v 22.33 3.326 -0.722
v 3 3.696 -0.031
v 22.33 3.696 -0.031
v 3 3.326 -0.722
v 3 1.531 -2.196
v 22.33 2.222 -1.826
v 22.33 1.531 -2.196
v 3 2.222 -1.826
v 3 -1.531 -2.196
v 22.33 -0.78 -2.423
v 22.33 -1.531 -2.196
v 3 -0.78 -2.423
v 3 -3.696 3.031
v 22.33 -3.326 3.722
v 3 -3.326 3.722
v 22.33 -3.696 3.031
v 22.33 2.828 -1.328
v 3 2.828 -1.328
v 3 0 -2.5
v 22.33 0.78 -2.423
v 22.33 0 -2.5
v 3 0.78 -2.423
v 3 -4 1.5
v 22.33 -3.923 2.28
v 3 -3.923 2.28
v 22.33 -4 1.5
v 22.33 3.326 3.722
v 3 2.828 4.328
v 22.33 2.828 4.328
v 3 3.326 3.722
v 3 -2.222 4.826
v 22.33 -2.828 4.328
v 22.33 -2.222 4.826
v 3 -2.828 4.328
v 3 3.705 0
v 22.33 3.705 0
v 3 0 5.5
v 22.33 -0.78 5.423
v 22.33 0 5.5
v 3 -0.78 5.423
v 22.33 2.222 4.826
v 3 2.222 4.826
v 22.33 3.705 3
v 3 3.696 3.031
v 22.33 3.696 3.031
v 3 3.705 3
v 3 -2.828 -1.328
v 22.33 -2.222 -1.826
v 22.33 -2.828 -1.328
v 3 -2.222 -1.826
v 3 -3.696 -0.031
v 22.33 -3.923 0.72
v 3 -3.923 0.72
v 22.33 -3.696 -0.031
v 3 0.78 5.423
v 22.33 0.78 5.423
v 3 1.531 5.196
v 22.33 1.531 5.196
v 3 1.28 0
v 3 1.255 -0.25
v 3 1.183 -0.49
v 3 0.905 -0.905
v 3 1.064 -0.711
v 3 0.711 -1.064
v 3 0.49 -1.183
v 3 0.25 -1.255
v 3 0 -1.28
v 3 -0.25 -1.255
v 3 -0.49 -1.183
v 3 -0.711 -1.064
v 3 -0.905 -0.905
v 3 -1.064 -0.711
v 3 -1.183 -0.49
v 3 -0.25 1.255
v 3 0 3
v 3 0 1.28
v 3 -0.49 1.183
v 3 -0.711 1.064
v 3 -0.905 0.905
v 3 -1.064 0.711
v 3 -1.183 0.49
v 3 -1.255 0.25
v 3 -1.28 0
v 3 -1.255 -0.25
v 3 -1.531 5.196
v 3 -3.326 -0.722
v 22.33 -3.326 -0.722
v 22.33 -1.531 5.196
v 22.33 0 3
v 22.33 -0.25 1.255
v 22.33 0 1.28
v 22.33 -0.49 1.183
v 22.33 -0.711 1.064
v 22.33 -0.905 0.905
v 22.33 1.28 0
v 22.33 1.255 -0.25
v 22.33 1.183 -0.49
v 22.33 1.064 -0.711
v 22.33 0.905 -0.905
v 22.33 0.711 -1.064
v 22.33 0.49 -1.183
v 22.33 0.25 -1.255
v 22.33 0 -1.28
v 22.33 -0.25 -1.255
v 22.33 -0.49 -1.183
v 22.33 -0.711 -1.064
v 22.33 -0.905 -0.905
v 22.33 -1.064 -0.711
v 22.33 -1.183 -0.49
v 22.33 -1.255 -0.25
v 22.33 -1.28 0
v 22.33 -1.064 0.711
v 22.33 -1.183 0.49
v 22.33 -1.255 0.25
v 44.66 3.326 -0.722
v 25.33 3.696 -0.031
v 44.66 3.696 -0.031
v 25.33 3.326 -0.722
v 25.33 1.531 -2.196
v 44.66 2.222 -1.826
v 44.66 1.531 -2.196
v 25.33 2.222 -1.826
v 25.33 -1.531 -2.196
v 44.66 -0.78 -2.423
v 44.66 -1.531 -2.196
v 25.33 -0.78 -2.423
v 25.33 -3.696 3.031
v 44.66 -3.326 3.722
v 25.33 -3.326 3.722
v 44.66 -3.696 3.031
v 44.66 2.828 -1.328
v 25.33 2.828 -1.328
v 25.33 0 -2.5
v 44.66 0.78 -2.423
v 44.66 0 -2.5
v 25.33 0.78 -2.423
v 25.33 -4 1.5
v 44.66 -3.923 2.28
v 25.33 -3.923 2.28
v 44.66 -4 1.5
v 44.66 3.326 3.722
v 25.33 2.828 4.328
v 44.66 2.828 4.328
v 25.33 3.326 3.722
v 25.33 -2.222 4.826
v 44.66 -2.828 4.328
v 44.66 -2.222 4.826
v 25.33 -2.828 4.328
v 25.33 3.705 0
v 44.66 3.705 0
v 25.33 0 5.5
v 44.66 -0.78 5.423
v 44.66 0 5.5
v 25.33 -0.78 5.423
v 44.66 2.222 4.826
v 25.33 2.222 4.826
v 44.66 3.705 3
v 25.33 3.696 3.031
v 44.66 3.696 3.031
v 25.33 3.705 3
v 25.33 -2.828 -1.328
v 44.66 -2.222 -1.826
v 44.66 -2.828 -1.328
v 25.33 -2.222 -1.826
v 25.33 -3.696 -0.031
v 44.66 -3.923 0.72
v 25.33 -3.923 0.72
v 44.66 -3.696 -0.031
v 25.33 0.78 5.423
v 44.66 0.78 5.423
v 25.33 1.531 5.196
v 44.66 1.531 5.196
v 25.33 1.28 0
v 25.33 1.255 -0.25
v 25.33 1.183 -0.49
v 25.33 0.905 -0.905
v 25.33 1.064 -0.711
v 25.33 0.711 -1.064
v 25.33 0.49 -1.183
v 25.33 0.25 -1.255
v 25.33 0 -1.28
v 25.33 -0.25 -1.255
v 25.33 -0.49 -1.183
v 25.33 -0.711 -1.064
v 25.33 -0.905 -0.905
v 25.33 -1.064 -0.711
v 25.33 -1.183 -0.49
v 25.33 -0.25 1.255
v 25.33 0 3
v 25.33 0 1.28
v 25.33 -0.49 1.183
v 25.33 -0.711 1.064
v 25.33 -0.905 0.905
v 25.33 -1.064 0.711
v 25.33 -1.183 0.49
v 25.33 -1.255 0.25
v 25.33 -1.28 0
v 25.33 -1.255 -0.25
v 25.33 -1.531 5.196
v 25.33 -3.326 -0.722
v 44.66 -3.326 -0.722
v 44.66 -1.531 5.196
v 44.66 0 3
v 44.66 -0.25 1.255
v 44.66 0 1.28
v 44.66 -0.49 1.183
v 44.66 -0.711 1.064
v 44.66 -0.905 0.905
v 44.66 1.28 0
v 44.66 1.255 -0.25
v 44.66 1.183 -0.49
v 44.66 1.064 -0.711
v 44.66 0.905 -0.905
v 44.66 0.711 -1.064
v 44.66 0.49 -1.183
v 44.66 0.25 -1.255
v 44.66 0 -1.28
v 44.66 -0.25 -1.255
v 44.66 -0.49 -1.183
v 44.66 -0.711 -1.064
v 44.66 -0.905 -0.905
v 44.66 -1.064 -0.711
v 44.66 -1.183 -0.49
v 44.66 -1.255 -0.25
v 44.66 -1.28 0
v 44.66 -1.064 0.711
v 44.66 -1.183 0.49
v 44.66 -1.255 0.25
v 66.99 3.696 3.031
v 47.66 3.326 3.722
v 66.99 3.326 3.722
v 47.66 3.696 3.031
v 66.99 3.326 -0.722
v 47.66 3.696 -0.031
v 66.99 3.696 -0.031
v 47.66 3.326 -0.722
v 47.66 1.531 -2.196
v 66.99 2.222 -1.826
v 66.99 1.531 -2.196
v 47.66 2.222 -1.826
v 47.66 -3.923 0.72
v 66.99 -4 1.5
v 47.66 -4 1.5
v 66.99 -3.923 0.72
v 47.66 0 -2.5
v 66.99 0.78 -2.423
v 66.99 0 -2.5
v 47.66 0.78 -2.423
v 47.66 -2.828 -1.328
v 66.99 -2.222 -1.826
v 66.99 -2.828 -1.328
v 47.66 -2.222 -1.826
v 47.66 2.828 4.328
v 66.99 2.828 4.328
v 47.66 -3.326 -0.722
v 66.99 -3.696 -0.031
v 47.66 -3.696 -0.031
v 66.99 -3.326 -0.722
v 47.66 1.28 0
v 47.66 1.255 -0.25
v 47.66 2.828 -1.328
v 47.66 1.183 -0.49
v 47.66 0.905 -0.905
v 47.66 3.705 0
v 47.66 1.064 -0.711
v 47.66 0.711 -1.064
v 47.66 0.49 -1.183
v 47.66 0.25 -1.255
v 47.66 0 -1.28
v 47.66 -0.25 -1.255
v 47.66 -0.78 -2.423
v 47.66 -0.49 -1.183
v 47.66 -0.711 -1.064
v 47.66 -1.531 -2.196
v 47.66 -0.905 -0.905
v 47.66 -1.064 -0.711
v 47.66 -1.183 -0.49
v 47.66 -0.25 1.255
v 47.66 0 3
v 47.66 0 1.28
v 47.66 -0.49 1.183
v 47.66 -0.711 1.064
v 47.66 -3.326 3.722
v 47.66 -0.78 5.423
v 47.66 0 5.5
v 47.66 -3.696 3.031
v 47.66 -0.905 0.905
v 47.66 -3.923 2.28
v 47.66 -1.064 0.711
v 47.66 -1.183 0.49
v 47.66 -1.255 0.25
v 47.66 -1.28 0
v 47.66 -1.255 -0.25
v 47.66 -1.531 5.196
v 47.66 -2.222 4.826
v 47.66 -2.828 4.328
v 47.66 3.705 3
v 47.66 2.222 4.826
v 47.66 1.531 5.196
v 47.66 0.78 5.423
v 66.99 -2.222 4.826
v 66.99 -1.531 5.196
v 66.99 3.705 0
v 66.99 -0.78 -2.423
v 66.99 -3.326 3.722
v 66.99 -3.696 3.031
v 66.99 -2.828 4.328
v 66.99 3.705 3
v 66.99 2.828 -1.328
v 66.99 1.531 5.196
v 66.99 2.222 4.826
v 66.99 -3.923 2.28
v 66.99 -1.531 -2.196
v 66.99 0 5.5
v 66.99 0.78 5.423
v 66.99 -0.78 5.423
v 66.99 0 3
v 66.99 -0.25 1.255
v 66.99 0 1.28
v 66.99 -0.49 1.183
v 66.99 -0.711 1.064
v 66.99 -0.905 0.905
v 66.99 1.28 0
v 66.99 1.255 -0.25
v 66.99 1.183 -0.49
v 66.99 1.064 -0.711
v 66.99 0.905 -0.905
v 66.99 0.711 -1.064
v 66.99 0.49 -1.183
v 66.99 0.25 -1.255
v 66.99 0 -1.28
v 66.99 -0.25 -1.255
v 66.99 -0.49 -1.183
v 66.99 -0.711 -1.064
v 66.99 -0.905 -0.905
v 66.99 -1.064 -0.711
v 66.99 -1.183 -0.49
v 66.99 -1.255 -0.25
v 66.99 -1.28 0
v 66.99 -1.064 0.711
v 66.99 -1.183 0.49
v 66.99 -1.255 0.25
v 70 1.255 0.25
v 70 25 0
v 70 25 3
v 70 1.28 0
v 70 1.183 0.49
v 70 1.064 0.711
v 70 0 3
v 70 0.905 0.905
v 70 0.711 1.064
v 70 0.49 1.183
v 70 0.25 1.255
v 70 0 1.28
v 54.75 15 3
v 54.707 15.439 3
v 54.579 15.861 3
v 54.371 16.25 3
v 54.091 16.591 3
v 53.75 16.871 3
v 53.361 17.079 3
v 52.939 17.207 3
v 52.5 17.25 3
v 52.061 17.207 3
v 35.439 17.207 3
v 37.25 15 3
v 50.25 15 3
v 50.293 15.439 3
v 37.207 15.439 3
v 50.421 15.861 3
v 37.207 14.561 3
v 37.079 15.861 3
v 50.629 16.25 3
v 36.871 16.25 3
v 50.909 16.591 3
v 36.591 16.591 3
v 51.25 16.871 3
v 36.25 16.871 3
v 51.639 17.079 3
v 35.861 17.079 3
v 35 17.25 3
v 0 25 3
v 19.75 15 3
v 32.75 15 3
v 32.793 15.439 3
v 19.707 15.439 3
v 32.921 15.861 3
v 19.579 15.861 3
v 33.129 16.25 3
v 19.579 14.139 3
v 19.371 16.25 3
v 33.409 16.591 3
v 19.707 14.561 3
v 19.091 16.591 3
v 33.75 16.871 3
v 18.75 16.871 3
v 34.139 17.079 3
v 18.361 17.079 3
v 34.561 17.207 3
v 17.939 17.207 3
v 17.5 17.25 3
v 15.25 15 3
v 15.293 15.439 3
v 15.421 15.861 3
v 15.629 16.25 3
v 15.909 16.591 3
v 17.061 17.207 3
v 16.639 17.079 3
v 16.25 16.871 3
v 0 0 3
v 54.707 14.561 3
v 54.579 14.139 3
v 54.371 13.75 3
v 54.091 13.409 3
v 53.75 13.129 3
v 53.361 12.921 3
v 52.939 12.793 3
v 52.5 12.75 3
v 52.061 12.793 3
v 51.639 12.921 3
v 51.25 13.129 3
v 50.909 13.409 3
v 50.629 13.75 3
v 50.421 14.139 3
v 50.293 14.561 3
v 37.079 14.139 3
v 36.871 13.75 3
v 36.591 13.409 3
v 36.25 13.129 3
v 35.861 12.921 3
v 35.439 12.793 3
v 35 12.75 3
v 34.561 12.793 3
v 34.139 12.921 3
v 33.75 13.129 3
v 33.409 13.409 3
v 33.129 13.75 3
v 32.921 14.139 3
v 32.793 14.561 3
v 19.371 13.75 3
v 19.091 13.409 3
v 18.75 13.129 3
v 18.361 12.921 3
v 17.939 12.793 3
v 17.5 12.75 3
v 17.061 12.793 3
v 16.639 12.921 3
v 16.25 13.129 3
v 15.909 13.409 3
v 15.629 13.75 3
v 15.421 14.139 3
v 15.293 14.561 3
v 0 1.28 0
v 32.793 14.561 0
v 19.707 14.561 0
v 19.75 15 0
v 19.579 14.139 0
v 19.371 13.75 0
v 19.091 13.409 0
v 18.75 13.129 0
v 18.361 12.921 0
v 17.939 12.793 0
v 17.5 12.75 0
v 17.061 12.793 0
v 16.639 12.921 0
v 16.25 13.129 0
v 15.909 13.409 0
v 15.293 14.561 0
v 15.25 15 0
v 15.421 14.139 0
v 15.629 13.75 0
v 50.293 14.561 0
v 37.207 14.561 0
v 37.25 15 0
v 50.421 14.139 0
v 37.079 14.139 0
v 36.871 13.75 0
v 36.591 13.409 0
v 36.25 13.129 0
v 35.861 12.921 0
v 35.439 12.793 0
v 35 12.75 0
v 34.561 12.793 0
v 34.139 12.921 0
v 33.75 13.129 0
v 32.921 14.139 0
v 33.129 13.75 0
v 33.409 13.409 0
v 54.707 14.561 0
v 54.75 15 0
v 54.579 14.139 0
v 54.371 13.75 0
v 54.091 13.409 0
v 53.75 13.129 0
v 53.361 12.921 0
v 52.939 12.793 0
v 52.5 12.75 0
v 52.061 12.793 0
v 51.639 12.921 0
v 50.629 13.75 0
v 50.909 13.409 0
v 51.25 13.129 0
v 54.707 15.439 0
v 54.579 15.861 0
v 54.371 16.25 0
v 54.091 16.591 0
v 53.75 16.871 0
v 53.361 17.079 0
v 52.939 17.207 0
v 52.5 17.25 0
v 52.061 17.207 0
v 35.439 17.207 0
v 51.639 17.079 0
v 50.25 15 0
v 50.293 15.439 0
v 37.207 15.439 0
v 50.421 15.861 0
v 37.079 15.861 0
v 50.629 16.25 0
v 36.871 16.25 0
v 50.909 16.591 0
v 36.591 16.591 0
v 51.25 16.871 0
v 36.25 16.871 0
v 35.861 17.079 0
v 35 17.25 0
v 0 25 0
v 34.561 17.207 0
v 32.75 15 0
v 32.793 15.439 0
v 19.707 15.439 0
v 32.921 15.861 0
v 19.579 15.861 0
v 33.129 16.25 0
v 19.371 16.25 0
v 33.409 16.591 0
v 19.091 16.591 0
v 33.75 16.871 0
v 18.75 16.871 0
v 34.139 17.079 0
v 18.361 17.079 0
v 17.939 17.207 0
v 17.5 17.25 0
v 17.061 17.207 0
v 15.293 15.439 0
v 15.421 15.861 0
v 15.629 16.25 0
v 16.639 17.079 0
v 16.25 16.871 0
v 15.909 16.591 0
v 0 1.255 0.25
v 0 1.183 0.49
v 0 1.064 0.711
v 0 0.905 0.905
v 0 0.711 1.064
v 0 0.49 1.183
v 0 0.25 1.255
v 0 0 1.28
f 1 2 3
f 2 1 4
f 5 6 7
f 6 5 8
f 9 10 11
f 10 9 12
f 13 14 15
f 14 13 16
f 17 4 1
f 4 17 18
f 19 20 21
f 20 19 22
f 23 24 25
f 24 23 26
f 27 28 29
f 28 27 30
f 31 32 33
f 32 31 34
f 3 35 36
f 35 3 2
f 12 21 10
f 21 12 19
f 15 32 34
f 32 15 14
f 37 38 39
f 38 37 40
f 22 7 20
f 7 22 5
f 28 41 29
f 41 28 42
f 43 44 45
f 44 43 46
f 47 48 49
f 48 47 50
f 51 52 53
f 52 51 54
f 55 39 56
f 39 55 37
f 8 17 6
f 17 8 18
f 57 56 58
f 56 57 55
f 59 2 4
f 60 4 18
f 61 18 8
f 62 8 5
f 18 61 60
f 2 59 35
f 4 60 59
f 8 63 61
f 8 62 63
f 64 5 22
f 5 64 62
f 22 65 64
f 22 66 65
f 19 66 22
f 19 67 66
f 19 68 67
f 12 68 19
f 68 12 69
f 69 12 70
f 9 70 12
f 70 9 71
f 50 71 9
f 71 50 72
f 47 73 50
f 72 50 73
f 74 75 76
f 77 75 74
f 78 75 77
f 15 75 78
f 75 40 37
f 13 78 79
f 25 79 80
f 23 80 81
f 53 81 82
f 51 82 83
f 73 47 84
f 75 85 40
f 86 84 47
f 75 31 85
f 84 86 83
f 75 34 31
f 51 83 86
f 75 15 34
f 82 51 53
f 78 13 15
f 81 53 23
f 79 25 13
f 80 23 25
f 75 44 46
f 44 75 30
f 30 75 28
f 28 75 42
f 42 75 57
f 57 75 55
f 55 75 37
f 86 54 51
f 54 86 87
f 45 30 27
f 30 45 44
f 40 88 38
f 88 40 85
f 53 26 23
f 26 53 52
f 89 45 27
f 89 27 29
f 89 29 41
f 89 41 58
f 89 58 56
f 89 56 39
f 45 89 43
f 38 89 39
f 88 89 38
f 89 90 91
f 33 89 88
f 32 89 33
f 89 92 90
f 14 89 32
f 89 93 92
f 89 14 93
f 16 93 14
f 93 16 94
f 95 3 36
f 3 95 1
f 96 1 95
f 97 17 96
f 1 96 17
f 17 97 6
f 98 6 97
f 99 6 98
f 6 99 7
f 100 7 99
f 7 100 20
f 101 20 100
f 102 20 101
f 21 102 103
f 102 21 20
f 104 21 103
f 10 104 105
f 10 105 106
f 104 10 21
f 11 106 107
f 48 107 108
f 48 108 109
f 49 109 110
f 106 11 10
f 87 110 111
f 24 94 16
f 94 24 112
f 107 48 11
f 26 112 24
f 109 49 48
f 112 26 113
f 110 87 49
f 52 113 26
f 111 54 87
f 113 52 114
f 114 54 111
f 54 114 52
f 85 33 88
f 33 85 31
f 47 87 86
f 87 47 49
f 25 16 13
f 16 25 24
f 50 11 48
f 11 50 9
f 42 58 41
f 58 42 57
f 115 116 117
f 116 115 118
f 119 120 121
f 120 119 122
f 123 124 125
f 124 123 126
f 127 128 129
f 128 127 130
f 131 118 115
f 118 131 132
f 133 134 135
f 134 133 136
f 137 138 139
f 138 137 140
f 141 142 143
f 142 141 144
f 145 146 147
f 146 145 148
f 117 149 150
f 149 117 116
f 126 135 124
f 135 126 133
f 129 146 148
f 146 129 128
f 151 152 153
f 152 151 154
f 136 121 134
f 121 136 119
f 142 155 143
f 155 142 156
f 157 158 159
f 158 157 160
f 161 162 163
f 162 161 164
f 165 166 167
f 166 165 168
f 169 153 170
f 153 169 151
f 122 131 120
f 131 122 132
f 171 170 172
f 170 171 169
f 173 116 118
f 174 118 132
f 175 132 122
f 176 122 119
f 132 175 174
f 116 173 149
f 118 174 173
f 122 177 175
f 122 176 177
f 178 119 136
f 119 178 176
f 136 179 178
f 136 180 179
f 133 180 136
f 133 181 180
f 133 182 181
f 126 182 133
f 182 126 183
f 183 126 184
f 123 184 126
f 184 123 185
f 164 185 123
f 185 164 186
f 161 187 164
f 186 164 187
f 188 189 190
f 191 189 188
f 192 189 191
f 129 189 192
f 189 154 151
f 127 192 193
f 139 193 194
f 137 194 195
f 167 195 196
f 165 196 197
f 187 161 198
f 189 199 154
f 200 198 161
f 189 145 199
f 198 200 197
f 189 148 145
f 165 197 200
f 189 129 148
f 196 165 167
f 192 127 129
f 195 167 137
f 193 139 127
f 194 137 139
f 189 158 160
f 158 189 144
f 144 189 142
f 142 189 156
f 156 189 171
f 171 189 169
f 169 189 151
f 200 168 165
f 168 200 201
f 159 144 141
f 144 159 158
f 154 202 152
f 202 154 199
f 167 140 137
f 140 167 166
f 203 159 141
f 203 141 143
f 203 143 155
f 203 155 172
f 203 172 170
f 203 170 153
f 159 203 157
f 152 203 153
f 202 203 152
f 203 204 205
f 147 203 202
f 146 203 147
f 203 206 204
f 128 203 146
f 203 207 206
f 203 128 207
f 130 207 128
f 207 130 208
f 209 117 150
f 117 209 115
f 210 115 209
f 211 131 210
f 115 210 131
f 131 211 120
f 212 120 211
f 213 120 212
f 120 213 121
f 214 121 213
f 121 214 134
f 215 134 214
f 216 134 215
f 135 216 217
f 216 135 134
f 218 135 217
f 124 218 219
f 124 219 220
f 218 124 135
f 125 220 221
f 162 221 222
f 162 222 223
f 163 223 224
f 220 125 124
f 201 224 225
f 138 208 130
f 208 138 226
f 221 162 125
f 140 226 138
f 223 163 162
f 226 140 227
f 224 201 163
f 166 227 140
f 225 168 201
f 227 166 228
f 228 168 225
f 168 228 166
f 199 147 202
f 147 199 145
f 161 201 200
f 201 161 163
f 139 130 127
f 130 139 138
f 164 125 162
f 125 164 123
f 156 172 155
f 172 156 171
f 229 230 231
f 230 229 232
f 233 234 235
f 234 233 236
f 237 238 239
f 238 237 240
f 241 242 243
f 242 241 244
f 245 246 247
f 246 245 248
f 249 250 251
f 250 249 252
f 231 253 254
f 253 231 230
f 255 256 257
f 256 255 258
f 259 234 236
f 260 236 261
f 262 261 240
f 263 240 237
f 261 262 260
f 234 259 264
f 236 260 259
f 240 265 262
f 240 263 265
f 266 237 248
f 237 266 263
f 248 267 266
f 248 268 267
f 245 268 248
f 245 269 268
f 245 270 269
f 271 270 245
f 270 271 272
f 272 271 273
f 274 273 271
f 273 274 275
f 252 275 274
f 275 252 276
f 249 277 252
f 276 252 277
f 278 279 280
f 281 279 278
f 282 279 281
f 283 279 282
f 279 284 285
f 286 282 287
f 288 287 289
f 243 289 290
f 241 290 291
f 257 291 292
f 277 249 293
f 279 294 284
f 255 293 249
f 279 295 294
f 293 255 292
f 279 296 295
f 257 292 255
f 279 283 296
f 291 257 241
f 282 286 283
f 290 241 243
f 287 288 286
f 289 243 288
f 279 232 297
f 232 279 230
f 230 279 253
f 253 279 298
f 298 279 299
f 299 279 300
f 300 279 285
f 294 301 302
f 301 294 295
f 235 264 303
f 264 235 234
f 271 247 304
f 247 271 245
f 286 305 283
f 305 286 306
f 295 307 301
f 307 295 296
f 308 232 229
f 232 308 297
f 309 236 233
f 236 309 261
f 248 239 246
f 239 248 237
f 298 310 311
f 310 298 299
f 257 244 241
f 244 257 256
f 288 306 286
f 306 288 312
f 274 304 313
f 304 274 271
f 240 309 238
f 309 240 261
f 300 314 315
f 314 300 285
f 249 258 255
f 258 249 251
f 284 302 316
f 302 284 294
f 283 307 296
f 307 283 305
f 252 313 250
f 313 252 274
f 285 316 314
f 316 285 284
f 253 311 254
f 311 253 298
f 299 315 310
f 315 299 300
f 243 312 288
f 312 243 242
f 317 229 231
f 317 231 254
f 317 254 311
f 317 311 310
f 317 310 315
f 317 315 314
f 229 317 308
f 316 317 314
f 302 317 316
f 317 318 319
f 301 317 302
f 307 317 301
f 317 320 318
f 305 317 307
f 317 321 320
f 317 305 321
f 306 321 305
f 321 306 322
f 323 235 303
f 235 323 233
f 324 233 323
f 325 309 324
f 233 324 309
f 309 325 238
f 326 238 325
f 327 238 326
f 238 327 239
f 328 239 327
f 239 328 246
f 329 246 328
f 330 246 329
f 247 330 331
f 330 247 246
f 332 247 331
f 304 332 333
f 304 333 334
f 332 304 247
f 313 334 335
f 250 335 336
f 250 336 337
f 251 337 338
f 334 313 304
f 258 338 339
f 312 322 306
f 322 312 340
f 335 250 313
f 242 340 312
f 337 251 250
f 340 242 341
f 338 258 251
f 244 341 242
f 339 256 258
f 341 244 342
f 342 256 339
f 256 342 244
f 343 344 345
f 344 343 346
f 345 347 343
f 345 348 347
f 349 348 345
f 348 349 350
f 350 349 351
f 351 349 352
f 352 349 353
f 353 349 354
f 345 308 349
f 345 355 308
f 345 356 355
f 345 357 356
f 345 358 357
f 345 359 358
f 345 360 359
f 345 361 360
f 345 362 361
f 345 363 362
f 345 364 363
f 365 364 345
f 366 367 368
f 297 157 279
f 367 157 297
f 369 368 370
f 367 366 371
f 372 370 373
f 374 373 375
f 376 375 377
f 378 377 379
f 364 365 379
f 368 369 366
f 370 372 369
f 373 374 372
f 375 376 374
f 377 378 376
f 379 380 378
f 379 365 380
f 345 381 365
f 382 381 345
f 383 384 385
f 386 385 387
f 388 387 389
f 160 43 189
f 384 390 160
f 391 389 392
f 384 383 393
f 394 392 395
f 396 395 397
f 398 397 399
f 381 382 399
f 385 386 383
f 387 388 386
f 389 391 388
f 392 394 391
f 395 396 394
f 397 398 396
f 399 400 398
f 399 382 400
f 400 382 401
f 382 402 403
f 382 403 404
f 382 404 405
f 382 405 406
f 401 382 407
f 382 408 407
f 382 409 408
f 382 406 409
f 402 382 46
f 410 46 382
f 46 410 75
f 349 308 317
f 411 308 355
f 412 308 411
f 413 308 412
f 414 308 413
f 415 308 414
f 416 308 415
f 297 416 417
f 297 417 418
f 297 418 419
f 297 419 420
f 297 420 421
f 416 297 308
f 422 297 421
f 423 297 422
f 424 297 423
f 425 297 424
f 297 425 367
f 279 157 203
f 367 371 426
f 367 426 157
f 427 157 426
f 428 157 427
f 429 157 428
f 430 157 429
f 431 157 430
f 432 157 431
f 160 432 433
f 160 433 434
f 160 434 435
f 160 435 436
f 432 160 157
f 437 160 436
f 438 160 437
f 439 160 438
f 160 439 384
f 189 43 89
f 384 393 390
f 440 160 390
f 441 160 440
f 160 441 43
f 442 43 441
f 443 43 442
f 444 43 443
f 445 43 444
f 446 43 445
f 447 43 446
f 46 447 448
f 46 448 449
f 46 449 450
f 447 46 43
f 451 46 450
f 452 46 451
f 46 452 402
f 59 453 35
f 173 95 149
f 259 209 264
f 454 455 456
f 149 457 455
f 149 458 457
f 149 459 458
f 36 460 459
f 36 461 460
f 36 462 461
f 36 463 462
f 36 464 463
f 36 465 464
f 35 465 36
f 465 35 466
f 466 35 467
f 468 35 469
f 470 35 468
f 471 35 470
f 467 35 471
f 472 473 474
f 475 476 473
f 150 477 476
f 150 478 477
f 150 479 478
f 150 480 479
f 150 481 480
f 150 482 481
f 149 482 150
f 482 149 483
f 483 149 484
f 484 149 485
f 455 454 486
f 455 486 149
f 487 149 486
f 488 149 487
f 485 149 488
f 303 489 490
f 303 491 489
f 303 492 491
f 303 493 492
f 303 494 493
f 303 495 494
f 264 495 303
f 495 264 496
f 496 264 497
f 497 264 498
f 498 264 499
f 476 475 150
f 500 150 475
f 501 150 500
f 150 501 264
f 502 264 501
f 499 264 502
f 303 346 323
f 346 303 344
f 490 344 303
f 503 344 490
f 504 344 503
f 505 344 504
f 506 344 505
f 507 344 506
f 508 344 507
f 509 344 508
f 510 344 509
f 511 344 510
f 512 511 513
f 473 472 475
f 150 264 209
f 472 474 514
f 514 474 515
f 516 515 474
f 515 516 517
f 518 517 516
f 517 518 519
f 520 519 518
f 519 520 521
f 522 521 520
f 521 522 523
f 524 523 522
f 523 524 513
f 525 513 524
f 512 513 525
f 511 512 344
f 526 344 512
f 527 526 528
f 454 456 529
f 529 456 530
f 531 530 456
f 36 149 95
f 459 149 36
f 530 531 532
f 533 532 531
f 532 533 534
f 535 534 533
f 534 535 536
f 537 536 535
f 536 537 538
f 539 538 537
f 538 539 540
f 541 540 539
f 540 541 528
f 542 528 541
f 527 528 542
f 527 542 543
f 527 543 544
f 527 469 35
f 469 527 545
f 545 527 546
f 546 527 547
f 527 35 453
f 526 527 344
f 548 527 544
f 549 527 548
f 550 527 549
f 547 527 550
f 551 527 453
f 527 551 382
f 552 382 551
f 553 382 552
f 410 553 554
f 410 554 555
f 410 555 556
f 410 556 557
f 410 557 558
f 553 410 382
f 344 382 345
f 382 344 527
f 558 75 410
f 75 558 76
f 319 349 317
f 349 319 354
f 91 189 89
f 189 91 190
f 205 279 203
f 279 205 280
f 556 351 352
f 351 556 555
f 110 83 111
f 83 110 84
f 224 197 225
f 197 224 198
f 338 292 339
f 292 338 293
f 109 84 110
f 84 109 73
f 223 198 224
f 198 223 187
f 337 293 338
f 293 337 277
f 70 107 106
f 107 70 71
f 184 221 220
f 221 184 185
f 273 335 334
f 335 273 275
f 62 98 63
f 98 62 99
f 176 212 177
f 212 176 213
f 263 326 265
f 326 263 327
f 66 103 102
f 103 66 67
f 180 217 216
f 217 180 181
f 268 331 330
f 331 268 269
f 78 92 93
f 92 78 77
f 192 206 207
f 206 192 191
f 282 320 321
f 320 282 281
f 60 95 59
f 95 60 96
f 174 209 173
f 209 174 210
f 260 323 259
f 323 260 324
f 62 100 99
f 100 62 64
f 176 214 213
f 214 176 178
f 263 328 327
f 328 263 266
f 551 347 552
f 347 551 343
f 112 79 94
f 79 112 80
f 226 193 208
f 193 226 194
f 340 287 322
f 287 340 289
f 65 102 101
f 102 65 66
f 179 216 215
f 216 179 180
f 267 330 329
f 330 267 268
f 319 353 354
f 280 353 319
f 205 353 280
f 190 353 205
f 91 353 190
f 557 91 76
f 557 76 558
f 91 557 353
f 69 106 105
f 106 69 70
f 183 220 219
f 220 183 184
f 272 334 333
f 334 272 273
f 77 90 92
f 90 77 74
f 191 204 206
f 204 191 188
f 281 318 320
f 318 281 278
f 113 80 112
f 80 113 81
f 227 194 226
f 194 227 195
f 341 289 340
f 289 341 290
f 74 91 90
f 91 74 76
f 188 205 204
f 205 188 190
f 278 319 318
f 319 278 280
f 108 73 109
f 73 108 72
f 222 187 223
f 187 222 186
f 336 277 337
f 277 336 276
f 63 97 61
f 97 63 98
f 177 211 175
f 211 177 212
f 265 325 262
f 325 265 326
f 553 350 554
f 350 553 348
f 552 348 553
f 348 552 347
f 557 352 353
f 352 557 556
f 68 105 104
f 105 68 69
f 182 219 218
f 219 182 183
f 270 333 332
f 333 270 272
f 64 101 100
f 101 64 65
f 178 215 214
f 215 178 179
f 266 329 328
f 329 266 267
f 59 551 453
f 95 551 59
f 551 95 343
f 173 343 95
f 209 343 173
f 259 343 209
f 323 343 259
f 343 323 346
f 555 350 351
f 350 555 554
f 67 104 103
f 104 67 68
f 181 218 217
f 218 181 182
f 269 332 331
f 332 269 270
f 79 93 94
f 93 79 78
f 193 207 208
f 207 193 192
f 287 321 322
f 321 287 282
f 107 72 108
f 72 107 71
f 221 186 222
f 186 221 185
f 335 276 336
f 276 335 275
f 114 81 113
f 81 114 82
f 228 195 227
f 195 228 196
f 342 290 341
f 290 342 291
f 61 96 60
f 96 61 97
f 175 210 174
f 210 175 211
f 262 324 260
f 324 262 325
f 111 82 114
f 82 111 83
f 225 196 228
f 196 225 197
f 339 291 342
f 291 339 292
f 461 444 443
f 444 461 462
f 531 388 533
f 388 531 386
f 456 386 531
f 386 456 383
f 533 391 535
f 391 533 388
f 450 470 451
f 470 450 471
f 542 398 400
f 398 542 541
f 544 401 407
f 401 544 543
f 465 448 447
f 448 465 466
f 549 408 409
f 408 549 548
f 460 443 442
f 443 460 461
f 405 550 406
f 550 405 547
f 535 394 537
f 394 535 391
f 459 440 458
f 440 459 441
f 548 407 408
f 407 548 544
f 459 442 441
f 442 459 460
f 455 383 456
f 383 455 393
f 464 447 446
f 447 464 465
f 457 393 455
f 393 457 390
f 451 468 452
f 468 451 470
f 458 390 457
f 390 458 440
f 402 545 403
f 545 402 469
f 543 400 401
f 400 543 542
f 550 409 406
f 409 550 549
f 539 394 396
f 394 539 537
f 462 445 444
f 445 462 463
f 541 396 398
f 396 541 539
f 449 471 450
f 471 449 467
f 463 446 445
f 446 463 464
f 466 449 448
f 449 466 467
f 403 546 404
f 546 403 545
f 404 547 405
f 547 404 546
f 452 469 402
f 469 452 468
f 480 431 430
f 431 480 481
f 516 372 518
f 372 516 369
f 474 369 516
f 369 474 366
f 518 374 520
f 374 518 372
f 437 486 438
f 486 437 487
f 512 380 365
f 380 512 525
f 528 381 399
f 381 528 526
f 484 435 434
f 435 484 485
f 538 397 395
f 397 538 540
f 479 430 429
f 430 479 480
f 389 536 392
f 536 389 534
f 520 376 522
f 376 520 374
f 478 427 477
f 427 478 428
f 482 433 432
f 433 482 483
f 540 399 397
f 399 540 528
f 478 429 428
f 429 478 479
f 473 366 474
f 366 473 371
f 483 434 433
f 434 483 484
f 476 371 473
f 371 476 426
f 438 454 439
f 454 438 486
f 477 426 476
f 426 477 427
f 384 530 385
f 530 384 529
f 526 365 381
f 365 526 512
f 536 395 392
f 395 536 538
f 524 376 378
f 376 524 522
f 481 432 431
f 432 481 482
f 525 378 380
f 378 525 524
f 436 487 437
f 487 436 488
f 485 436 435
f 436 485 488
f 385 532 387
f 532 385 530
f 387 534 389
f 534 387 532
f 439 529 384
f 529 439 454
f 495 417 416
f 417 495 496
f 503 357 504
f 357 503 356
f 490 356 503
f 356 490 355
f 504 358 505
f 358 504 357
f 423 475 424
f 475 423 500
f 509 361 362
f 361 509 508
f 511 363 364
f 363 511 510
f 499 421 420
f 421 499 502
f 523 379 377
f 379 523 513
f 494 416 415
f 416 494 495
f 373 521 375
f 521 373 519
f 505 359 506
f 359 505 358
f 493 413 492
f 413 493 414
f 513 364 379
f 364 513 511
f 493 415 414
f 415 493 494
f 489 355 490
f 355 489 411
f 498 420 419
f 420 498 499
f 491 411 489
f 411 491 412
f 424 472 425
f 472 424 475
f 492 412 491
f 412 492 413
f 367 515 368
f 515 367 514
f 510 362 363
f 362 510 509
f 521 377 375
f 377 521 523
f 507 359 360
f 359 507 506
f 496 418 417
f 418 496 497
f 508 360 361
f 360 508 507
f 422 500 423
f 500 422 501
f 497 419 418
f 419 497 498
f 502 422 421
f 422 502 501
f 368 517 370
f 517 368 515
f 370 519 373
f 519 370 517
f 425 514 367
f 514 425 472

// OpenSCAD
$fn = 32;

// ----------------------------------------------------------------------
// Hinge leaf: 70 x 29 x 8 mm
// ----------------------------------------------------------------------

// --- parameters (mm) ---
plate_len = 70;           // leaf length, X
plate_w = 25;             // leaf width, Y
plate_t = 3;              // leaf thickness
barrel_d = 8;             // knuckle diameter
barrel_w = 19.33;         // knuckle width
knuckle_n = 3;            // number of knuckles
pin_d = 2.56;             // pin bore
gap = 3;                  // gap between the knuckles
screw_d = 4.5;            // screw clearance

module leaf() {
  cube([plate_len, plate_w, plate_t]);
}

module knuckles() {
  /* barrels sit on the leaf edge, the pin axis at half the leaf thickness */
  for (i = [0 : knuckle_n - 1])
    translate([gap + i * (barrel_w + gap), 0, plate_t * 0.5])
      rotate([0, 90, 0]) cylinder(h = barrel_w, d = barrel_d);
}

difference() {
  union() {
    leaf();
    knuckles();
  }
  rotate([0, 90, 0]) translate([0, 0, -1])
    cylinder(h = plate_len + 2, d = pin_d);
  translate([17.5, plate_w * 0.6, -1]) cylinder(h = plate_t + 2, d = screw_d);
  translate([35, plate_w * 0.6, -1]) cylinder(h = plate_t + 2, d = screw_d);
  translate([52.5, plate_w * 0.6, -1]) cylinder(h = plate_t + 2, d = screw_d);
}
